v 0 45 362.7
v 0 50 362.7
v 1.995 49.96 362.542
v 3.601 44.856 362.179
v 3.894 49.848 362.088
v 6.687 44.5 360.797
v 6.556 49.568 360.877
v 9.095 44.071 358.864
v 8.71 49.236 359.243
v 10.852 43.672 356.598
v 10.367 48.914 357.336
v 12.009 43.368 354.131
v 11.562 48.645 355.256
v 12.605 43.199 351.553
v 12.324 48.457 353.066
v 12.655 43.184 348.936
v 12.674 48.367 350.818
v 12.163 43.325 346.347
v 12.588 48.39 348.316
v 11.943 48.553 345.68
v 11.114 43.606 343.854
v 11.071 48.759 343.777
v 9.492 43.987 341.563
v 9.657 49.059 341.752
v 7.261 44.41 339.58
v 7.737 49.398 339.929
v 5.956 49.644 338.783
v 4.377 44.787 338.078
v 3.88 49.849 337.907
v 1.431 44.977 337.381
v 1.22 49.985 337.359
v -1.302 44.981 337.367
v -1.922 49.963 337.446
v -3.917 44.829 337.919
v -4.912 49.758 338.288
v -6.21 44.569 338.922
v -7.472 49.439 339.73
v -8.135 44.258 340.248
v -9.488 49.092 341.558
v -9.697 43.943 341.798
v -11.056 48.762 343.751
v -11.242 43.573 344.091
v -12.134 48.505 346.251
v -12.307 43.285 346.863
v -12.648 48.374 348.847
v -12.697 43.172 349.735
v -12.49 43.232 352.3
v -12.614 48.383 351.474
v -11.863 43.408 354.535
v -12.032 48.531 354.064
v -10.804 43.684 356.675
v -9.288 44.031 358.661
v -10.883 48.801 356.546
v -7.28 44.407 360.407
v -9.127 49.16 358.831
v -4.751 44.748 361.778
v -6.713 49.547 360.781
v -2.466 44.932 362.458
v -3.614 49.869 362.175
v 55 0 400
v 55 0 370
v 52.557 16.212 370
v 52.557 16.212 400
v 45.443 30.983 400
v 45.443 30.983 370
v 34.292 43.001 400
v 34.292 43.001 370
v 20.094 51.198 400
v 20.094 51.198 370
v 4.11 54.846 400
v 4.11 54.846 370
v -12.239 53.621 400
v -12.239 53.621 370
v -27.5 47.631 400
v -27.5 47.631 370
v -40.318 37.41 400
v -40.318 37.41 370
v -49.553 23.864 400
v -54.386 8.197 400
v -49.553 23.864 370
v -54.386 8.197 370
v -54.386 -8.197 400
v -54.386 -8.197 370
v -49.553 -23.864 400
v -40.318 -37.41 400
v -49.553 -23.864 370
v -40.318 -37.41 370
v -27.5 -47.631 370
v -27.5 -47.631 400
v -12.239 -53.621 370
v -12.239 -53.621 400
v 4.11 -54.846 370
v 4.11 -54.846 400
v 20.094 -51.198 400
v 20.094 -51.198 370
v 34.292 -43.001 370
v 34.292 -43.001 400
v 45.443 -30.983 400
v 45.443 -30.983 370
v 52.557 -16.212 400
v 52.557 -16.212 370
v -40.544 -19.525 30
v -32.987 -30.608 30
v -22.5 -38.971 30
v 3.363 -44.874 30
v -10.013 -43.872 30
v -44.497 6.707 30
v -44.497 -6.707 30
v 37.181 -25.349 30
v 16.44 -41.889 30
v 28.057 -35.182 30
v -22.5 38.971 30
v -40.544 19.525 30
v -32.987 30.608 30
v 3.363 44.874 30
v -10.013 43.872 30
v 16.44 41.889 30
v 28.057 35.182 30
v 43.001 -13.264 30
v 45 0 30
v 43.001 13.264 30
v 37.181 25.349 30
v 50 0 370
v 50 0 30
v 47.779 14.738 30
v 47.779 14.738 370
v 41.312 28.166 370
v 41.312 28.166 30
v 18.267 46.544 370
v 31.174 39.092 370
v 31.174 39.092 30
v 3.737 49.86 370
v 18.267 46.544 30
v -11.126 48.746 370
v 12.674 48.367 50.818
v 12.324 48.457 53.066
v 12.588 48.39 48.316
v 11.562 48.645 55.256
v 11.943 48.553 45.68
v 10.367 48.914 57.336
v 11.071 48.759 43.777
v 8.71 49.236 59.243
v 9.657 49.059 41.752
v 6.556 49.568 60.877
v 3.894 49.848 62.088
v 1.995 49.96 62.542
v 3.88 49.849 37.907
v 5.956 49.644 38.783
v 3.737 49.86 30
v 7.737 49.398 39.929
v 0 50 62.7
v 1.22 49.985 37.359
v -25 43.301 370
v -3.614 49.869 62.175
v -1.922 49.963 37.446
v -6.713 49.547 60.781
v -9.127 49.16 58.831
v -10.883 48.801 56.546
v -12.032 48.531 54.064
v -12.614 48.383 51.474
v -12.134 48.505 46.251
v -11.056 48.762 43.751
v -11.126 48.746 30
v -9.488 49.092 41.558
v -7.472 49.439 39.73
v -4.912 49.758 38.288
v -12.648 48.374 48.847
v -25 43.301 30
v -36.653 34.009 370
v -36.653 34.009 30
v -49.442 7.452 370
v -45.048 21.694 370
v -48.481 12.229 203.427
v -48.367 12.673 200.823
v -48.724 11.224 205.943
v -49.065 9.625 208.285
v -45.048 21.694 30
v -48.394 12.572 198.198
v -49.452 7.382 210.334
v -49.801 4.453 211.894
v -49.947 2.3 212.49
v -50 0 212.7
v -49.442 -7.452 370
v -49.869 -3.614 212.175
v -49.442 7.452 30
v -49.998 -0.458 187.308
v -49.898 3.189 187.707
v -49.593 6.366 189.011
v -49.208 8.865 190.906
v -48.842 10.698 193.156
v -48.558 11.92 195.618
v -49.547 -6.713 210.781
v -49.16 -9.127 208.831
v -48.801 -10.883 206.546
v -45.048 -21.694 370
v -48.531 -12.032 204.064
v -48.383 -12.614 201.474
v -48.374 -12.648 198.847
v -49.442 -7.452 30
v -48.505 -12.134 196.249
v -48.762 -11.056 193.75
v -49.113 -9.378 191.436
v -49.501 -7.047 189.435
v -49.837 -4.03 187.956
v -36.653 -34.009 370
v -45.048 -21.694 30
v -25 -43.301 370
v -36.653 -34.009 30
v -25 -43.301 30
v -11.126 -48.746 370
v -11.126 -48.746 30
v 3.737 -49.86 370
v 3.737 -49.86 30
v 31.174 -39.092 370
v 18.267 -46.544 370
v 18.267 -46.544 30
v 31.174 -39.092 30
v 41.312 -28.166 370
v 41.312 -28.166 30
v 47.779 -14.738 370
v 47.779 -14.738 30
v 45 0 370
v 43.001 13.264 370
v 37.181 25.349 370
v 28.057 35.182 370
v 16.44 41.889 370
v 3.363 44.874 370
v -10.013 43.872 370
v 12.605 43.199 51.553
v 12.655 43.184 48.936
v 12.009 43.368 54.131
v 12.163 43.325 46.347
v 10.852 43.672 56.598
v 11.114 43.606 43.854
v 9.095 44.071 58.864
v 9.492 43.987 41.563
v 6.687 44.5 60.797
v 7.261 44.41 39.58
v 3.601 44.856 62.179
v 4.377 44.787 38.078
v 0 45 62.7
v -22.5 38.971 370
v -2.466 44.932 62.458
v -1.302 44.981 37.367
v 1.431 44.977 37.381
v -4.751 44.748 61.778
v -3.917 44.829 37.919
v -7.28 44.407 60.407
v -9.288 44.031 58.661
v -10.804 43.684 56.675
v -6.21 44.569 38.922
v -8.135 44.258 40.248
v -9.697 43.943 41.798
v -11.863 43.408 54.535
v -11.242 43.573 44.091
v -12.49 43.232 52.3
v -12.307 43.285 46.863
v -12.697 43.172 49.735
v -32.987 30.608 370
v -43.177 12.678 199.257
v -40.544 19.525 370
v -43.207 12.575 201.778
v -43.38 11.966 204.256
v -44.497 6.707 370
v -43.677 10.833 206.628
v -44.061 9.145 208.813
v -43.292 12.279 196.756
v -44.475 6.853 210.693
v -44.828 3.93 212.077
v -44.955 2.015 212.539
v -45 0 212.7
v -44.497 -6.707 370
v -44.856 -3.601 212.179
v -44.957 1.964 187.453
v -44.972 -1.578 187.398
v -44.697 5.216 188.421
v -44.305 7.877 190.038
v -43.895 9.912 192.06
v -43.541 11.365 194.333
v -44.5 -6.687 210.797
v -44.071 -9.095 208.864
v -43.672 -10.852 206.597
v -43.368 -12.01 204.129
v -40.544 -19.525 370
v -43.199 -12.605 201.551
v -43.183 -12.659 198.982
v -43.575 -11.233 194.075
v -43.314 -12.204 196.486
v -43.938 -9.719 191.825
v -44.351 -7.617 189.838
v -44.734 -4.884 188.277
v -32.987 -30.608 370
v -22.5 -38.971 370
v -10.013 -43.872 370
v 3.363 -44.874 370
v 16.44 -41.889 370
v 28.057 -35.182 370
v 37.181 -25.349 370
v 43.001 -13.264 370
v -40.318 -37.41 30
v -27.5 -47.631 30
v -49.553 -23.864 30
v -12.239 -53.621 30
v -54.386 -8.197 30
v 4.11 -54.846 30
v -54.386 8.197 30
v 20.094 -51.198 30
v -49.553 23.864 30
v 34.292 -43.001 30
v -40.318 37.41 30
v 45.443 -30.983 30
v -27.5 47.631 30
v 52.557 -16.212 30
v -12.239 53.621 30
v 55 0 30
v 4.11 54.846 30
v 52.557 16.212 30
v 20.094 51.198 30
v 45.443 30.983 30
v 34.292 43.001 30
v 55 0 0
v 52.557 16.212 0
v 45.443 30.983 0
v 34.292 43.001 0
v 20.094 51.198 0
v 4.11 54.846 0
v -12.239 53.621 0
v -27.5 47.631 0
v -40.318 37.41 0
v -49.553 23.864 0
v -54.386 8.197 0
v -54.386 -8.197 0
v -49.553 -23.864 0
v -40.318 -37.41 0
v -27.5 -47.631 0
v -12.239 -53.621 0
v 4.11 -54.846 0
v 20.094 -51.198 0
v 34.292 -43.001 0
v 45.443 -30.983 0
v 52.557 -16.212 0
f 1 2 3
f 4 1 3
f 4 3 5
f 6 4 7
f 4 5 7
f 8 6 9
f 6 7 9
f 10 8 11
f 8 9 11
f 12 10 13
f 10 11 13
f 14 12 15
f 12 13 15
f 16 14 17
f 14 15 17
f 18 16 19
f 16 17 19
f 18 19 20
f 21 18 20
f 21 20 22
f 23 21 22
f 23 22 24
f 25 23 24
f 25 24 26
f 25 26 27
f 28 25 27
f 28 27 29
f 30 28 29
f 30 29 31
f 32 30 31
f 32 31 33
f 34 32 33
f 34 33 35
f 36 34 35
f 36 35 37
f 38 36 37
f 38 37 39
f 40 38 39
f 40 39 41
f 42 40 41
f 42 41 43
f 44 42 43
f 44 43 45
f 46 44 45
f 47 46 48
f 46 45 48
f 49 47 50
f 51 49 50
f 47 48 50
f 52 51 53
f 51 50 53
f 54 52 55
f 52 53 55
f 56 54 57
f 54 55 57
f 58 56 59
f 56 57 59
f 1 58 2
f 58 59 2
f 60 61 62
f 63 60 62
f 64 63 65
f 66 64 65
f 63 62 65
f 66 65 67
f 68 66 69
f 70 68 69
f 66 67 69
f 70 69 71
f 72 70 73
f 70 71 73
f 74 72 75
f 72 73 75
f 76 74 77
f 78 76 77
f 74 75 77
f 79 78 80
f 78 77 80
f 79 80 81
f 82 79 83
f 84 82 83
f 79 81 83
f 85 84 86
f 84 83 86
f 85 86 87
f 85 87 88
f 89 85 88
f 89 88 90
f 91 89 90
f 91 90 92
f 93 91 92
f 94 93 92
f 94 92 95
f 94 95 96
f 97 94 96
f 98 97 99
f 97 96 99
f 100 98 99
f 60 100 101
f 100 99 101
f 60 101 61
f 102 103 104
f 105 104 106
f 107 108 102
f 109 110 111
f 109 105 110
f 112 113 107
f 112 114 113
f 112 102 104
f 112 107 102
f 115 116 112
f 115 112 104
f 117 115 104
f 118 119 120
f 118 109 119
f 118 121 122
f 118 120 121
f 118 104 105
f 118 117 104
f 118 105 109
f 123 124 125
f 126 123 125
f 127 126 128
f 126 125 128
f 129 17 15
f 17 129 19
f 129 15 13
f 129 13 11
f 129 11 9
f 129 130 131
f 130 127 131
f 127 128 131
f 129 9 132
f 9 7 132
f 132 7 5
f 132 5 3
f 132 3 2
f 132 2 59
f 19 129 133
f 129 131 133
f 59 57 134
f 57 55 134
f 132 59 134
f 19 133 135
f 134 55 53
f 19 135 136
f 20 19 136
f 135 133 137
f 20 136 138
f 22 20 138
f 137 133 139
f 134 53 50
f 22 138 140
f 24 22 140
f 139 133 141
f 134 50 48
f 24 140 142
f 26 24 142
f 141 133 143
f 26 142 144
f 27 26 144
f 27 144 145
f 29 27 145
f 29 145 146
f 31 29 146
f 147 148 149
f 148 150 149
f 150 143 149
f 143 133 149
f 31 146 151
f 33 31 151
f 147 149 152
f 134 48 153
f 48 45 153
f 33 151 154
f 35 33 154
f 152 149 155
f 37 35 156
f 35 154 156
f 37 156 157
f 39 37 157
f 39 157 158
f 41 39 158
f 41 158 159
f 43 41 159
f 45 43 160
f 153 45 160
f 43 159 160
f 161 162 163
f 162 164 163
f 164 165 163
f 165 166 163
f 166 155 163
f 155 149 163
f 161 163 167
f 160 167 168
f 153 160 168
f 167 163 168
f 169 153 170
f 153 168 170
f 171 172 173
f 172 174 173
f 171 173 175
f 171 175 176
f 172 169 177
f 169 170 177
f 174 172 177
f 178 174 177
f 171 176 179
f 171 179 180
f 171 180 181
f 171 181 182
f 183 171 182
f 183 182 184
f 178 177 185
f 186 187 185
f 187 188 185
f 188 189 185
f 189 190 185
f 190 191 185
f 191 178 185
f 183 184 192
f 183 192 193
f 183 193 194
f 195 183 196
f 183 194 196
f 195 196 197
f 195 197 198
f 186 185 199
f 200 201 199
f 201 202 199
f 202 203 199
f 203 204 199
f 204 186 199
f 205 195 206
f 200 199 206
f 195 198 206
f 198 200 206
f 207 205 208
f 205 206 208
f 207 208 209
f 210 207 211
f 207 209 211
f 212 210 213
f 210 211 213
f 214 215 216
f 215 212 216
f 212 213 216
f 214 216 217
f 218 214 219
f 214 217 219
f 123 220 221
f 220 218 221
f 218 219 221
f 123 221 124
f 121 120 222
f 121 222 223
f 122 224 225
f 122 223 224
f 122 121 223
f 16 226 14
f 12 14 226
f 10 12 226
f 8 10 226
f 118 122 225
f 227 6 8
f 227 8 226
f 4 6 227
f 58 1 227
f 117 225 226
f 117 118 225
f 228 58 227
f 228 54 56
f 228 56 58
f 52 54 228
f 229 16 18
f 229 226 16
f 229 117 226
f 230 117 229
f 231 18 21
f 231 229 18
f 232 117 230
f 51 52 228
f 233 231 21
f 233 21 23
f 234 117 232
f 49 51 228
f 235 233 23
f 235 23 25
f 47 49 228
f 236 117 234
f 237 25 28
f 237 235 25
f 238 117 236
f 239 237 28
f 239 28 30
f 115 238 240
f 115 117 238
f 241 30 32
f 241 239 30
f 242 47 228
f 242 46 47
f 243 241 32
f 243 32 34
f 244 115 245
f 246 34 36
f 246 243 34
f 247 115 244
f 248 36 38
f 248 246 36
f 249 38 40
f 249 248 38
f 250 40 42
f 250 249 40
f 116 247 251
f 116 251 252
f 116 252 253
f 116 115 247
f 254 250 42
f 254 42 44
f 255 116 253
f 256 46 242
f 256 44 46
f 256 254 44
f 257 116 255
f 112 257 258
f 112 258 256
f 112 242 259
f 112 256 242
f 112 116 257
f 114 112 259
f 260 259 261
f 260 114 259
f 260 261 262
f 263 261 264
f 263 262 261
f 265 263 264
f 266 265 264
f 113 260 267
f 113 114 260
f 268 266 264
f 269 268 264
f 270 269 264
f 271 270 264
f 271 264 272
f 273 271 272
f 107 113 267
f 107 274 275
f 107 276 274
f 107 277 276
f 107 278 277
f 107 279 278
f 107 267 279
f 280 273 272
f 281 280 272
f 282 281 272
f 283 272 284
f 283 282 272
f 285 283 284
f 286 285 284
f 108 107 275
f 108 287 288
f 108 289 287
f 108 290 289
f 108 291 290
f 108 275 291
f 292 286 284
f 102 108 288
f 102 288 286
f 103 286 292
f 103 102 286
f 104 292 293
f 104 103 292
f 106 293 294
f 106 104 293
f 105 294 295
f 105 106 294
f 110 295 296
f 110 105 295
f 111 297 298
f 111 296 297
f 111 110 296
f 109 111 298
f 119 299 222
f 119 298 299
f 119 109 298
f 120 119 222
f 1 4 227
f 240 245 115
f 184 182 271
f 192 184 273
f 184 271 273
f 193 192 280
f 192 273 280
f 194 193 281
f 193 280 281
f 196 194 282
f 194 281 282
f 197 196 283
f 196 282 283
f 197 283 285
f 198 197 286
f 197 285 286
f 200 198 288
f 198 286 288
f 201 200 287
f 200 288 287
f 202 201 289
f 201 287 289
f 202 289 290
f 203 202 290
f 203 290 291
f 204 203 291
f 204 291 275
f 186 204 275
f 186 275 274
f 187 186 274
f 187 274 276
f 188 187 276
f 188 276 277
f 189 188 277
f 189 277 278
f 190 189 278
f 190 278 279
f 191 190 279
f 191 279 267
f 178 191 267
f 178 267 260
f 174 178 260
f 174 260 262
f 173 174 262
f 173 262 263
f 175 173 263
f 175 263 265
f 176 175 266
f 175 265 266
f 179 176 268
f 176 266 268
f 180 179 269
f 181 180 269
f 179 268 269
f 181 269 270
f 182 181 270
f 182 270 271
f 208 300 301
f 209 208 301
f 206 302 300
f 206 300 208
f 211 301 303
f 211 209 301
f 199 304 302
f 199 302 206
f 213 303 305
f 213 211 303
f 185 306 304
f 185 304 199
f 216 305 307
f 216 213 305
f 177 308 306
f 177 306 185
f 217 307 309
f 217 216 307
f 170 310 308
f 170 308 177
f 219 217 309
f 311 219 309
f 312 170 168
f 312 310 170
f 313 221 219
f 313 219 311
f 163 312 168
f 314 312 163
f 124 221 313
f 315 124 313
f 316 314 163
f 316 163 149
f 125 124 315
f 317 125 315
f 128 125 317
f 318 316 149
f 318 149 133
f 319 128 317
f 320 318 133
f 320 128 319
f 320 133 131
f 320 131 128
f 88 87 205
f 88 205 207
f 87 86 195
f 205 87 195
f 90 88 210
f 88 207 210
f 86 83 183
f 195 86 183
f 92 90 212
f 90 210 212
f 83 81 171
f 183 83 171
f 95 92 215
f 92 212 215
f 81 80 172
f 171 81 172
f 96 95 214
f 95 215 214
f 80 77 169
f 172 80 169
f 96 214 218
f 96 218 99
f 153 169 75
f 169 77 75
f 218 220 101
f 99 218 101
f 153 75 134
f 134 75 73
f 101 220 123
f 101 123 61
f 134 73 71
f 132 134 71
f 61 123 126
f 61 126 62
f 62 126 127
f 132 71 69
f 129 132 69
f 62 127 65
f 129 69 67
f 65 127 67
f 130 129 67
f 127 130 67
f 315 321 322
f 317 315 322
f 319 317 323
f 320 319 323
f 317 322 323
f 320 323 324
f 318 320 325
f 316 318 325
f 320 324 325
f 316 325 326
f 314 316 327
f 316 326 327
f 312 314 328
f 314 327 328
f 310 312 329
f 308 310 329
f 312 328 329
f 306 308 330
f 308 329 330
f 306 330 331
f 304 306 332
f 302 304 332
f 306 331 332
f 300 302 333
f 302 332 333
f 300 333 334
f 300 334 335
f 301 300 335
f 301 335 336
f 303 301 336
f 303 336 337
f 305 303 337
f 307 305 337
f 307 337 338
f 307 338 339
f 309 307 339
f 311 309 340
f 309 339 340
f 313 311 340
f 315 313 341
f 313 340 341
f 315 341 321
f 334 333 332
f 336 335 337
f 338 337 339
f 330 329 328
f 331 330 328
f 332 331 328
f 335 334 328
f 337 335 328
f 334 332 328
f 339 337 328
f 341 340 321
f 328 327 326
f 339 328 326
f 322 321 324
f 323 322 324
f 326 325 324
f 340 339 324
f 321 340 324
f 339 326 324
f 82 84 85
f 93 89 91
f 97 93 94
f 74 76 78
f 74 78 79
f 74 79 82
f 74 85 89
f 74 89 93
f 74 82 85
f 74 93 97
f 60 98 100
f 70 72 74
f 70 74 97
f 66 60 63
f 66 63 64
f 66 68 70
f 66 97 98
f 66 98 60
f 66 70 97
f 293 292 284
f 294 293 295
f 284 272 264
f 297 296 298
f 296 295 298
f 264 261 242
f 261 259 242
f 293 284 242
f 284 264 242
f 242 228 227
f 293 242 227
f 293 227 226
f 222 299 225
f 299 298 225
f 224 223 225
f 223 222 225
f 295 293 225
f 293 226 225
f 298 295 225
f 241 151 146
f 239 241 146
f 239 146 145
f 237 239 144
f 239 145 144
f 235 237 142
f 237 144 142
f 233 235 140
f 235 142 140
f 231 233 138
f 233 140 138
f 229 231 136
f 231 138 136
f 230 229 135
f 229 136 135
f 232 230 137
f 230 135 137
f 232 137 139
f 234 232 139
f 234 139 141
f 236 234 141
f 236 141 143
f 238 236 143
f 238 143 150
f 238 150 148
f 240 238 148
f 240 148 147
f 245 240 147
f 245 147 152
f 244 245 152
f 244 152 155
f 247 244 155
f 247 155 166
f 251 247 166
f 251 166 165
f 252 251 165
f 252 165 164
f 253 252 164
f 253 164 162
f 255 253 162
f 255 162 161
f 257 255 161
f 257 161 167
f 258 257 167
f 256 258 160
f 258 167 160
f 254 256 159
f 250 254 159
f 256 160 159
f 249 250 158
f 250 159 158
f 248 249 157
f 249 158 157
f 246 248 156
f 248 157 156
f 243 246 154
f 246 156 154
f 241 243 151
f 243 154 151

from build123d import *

# Parameters (mm, degrees)
CROQUIS1_R              = 50
CROQUIS1_R_2            = 45
SALIENTE_EXTRUIR1_DEPTH = 400
CROQUIS2_R              = 55
SALIENTE_EXTRUIR2_DEPTH = 30
SALIENTE_EXTRUIR3_START = -30
CROQUIS3_R              = 55
SALIENTE_EXTRUIR3_DEPTH = 30
CROQUIS5_R              = 12.7
CORTAR_EXTRUIR2_DEPTH   = 60
CROQUIS7_R              = 12.7
CORTAR_EXTRUIR4_DEPTH   = 106


with BuildPart() as part:
    # Croquis1 → Saliente-Extruir1 (new body)
    with BuildSketch(Plane.XY):
        Circle(CROQUIS1_R)
        Circle(CROQUIS1_R_2, mode=Mode.SUBTRACT)
    extrude(amount=SALIENTE_EXTRUIR1_DEPTH)

    # Croquis2 → Saliente-Extruir2 (add)
    with BuildSketch(Plane.XY):
        Circle(CROQUIS2_R)
    extrude(amount=SALIENTE_EXTRUIR2_DEPTH)

    # Croquis3 → Saliente-Extruir3 (add)
    with BuildSketch(Plane.XY.offset(400).offset(SALIENTE_EXTRUIR3_START)):
        Circle(CROQUIS3_R)
    extrude(amount=SALIENTE_EXTRUIR3_DEPTH)

    # Croquis5 → Cortar-Extruir2 (cut)
    with BuildSketch(Plane(origin=(0, 50, 0), x_dir=(1, 0, 0), z_dir=(0, 1, 0))):
        with Locations(Location((0, -350, 0), (0, 0, 270))):
            Circle(CROQUIS5_R)
        with Locations(Location((0, -50, 0), (0, 0, 270))):
            Circle(CROQUIS5_R)
    extrude(amount=-CORTAR_EXTRUIR2_DEPTH, mode=Mode.SUBTRACT)

    # Croquis7 → Cortar-Extruir4 (cut)
    with BuildSketch(Plane(origin=(0, 0, 0), x_dir=(0, 0, -1), z_dir=(1, 0, 0))):
        with Locations(Location((-200, 0, 0), (0, 0, 180))):
            Circle(CROQUIS7_R)
    extrude(amount=-CORTAR_EXTRUIR4_DEPTH, mode=Mode.SUBTRACT)


solid = part.part
